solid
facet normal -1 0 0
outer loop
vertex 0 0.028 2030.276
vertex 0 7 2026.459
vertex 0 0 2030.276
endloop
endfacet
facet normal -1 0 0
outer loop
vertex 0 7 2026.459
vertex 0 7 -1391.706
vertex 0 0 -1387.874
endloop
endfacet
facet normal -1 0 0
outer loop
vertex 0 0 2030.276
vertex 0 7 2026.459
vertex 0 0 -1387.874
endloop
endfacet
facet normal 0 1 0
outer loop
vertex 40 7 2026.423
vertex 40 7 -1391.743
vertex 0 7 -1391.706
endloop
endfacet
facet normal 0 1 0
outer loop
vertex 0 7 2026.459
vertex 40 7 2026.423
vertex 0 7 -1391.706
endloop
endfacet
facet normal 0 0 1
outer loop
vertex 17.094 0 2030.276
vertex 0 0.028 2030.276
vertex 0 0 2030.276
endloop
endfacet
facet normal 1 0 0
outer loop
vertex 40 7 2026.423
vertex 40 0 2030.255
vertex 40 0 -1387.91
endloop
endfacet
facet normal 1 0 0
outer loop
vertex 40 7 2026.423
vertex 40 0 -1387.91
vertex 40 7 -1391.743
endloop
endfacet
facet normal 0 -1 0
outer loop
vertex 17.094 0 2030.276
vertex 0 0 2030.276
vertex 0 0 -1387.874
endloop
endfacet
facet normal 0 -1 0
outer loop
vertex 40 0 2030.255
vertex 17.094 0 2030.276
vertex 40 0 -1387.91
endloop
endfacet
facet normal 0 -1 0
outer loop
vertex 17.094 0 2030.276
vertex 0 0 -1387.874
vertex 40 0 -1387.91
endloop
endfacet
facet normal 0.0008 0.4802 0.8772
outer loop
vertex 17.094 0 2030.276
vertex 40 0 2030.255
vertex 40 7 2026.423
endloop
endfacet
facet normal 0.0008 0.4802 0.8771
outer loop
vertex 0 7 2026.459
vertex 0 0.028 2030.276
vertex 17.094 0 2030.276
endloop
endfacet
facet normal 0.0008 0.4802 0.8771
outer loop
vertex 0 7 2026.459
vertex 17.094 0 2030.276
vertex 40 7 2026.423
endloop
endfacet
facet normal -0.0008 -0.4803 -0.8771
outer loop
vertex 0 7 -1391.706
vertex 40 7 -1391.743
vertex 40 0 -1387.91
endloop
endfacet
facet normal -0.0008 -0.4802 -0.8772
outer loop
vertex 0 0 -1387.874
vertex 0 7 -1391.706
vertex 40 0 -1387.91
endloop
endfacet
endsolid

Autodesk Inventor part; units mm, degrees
ref_plane "Начальная плоскость" through (0, 0, -1391.7559) normal (0, 0, 1) x (1, 0, 0)
ref_plane "Конечная плоскость" through (0, 0, 2030.2763) normal (0, 0, 1) x (1, 0, 0)
sketch "Эскиз" plane through (0, 0, 0) normal (0, 0, 1) x (1, 0, 0)
  line L0 (0, 0) -> (40, 0)
  line L1 (40, 0) -> (40, 7)
  line L2 (40, 7) -> (0, 7)
  line L3 (0, 7) -> (0, 0)
  point P0 (0, 0)
extrude "Тело" add sketch "Эскиз" along normal up to surface (3422.0322 mm away) from surface at -1391.7559
sketch "Эскиз6" plane through (0, 0, 0) normal (0, 0, 1) x (1, 0, 0)
  line L0 (0, 0) -> (10, 0)
ref_plane "РабПлоскость5" through (0, 0, 0) normal (0, -1, 0) x (1, 0, 0)
sketch "Эскиз7" plane through (0, 0, 0) normal (0, -1, 0) x (1, 0, 0)
  line L0 (-2, -1391.7559) -> (12, -1391.7559)
  line L1 (-2, 2030.2763) -> (12, 2030.2763)
  dimension "d17" = 3422.0322
ref_plane "РабПлоскость6" through (-26.0947, -656.8641, -1028.226) normal (-0.0008, -0.4802, -0.8771) x (1, -0.0031, 0.0008)
split "Разделение1" plane through (-26.0947, -656.8641, -1028.226) removes the side toward (-0.0008, -0.4802, -0.8771)
ref_plane "РабПлоскость7" through (63.6918, -785.0456, 2460.0353) normal (0.0008, 0.4802, 0.8771) x (1, -0.0002, -0.0008)
split "Разделение2" plane through (63.6918, -785.0456, 2460.0353) removes the side toward (0.0008, 0.4802, 0.8771)
equation "\"G_OFFSET_START\" = 1391.75591"
equation "\"G_OFFSET_END\" = 225.6187"
equation "\"d12\" = -G_OFFSET_START"
equation "\"G_L\" = d17"
equation "\"ДЛИНА\" = 3422.0322"
properties part number "Планка перил 40х7" material "Береза"
